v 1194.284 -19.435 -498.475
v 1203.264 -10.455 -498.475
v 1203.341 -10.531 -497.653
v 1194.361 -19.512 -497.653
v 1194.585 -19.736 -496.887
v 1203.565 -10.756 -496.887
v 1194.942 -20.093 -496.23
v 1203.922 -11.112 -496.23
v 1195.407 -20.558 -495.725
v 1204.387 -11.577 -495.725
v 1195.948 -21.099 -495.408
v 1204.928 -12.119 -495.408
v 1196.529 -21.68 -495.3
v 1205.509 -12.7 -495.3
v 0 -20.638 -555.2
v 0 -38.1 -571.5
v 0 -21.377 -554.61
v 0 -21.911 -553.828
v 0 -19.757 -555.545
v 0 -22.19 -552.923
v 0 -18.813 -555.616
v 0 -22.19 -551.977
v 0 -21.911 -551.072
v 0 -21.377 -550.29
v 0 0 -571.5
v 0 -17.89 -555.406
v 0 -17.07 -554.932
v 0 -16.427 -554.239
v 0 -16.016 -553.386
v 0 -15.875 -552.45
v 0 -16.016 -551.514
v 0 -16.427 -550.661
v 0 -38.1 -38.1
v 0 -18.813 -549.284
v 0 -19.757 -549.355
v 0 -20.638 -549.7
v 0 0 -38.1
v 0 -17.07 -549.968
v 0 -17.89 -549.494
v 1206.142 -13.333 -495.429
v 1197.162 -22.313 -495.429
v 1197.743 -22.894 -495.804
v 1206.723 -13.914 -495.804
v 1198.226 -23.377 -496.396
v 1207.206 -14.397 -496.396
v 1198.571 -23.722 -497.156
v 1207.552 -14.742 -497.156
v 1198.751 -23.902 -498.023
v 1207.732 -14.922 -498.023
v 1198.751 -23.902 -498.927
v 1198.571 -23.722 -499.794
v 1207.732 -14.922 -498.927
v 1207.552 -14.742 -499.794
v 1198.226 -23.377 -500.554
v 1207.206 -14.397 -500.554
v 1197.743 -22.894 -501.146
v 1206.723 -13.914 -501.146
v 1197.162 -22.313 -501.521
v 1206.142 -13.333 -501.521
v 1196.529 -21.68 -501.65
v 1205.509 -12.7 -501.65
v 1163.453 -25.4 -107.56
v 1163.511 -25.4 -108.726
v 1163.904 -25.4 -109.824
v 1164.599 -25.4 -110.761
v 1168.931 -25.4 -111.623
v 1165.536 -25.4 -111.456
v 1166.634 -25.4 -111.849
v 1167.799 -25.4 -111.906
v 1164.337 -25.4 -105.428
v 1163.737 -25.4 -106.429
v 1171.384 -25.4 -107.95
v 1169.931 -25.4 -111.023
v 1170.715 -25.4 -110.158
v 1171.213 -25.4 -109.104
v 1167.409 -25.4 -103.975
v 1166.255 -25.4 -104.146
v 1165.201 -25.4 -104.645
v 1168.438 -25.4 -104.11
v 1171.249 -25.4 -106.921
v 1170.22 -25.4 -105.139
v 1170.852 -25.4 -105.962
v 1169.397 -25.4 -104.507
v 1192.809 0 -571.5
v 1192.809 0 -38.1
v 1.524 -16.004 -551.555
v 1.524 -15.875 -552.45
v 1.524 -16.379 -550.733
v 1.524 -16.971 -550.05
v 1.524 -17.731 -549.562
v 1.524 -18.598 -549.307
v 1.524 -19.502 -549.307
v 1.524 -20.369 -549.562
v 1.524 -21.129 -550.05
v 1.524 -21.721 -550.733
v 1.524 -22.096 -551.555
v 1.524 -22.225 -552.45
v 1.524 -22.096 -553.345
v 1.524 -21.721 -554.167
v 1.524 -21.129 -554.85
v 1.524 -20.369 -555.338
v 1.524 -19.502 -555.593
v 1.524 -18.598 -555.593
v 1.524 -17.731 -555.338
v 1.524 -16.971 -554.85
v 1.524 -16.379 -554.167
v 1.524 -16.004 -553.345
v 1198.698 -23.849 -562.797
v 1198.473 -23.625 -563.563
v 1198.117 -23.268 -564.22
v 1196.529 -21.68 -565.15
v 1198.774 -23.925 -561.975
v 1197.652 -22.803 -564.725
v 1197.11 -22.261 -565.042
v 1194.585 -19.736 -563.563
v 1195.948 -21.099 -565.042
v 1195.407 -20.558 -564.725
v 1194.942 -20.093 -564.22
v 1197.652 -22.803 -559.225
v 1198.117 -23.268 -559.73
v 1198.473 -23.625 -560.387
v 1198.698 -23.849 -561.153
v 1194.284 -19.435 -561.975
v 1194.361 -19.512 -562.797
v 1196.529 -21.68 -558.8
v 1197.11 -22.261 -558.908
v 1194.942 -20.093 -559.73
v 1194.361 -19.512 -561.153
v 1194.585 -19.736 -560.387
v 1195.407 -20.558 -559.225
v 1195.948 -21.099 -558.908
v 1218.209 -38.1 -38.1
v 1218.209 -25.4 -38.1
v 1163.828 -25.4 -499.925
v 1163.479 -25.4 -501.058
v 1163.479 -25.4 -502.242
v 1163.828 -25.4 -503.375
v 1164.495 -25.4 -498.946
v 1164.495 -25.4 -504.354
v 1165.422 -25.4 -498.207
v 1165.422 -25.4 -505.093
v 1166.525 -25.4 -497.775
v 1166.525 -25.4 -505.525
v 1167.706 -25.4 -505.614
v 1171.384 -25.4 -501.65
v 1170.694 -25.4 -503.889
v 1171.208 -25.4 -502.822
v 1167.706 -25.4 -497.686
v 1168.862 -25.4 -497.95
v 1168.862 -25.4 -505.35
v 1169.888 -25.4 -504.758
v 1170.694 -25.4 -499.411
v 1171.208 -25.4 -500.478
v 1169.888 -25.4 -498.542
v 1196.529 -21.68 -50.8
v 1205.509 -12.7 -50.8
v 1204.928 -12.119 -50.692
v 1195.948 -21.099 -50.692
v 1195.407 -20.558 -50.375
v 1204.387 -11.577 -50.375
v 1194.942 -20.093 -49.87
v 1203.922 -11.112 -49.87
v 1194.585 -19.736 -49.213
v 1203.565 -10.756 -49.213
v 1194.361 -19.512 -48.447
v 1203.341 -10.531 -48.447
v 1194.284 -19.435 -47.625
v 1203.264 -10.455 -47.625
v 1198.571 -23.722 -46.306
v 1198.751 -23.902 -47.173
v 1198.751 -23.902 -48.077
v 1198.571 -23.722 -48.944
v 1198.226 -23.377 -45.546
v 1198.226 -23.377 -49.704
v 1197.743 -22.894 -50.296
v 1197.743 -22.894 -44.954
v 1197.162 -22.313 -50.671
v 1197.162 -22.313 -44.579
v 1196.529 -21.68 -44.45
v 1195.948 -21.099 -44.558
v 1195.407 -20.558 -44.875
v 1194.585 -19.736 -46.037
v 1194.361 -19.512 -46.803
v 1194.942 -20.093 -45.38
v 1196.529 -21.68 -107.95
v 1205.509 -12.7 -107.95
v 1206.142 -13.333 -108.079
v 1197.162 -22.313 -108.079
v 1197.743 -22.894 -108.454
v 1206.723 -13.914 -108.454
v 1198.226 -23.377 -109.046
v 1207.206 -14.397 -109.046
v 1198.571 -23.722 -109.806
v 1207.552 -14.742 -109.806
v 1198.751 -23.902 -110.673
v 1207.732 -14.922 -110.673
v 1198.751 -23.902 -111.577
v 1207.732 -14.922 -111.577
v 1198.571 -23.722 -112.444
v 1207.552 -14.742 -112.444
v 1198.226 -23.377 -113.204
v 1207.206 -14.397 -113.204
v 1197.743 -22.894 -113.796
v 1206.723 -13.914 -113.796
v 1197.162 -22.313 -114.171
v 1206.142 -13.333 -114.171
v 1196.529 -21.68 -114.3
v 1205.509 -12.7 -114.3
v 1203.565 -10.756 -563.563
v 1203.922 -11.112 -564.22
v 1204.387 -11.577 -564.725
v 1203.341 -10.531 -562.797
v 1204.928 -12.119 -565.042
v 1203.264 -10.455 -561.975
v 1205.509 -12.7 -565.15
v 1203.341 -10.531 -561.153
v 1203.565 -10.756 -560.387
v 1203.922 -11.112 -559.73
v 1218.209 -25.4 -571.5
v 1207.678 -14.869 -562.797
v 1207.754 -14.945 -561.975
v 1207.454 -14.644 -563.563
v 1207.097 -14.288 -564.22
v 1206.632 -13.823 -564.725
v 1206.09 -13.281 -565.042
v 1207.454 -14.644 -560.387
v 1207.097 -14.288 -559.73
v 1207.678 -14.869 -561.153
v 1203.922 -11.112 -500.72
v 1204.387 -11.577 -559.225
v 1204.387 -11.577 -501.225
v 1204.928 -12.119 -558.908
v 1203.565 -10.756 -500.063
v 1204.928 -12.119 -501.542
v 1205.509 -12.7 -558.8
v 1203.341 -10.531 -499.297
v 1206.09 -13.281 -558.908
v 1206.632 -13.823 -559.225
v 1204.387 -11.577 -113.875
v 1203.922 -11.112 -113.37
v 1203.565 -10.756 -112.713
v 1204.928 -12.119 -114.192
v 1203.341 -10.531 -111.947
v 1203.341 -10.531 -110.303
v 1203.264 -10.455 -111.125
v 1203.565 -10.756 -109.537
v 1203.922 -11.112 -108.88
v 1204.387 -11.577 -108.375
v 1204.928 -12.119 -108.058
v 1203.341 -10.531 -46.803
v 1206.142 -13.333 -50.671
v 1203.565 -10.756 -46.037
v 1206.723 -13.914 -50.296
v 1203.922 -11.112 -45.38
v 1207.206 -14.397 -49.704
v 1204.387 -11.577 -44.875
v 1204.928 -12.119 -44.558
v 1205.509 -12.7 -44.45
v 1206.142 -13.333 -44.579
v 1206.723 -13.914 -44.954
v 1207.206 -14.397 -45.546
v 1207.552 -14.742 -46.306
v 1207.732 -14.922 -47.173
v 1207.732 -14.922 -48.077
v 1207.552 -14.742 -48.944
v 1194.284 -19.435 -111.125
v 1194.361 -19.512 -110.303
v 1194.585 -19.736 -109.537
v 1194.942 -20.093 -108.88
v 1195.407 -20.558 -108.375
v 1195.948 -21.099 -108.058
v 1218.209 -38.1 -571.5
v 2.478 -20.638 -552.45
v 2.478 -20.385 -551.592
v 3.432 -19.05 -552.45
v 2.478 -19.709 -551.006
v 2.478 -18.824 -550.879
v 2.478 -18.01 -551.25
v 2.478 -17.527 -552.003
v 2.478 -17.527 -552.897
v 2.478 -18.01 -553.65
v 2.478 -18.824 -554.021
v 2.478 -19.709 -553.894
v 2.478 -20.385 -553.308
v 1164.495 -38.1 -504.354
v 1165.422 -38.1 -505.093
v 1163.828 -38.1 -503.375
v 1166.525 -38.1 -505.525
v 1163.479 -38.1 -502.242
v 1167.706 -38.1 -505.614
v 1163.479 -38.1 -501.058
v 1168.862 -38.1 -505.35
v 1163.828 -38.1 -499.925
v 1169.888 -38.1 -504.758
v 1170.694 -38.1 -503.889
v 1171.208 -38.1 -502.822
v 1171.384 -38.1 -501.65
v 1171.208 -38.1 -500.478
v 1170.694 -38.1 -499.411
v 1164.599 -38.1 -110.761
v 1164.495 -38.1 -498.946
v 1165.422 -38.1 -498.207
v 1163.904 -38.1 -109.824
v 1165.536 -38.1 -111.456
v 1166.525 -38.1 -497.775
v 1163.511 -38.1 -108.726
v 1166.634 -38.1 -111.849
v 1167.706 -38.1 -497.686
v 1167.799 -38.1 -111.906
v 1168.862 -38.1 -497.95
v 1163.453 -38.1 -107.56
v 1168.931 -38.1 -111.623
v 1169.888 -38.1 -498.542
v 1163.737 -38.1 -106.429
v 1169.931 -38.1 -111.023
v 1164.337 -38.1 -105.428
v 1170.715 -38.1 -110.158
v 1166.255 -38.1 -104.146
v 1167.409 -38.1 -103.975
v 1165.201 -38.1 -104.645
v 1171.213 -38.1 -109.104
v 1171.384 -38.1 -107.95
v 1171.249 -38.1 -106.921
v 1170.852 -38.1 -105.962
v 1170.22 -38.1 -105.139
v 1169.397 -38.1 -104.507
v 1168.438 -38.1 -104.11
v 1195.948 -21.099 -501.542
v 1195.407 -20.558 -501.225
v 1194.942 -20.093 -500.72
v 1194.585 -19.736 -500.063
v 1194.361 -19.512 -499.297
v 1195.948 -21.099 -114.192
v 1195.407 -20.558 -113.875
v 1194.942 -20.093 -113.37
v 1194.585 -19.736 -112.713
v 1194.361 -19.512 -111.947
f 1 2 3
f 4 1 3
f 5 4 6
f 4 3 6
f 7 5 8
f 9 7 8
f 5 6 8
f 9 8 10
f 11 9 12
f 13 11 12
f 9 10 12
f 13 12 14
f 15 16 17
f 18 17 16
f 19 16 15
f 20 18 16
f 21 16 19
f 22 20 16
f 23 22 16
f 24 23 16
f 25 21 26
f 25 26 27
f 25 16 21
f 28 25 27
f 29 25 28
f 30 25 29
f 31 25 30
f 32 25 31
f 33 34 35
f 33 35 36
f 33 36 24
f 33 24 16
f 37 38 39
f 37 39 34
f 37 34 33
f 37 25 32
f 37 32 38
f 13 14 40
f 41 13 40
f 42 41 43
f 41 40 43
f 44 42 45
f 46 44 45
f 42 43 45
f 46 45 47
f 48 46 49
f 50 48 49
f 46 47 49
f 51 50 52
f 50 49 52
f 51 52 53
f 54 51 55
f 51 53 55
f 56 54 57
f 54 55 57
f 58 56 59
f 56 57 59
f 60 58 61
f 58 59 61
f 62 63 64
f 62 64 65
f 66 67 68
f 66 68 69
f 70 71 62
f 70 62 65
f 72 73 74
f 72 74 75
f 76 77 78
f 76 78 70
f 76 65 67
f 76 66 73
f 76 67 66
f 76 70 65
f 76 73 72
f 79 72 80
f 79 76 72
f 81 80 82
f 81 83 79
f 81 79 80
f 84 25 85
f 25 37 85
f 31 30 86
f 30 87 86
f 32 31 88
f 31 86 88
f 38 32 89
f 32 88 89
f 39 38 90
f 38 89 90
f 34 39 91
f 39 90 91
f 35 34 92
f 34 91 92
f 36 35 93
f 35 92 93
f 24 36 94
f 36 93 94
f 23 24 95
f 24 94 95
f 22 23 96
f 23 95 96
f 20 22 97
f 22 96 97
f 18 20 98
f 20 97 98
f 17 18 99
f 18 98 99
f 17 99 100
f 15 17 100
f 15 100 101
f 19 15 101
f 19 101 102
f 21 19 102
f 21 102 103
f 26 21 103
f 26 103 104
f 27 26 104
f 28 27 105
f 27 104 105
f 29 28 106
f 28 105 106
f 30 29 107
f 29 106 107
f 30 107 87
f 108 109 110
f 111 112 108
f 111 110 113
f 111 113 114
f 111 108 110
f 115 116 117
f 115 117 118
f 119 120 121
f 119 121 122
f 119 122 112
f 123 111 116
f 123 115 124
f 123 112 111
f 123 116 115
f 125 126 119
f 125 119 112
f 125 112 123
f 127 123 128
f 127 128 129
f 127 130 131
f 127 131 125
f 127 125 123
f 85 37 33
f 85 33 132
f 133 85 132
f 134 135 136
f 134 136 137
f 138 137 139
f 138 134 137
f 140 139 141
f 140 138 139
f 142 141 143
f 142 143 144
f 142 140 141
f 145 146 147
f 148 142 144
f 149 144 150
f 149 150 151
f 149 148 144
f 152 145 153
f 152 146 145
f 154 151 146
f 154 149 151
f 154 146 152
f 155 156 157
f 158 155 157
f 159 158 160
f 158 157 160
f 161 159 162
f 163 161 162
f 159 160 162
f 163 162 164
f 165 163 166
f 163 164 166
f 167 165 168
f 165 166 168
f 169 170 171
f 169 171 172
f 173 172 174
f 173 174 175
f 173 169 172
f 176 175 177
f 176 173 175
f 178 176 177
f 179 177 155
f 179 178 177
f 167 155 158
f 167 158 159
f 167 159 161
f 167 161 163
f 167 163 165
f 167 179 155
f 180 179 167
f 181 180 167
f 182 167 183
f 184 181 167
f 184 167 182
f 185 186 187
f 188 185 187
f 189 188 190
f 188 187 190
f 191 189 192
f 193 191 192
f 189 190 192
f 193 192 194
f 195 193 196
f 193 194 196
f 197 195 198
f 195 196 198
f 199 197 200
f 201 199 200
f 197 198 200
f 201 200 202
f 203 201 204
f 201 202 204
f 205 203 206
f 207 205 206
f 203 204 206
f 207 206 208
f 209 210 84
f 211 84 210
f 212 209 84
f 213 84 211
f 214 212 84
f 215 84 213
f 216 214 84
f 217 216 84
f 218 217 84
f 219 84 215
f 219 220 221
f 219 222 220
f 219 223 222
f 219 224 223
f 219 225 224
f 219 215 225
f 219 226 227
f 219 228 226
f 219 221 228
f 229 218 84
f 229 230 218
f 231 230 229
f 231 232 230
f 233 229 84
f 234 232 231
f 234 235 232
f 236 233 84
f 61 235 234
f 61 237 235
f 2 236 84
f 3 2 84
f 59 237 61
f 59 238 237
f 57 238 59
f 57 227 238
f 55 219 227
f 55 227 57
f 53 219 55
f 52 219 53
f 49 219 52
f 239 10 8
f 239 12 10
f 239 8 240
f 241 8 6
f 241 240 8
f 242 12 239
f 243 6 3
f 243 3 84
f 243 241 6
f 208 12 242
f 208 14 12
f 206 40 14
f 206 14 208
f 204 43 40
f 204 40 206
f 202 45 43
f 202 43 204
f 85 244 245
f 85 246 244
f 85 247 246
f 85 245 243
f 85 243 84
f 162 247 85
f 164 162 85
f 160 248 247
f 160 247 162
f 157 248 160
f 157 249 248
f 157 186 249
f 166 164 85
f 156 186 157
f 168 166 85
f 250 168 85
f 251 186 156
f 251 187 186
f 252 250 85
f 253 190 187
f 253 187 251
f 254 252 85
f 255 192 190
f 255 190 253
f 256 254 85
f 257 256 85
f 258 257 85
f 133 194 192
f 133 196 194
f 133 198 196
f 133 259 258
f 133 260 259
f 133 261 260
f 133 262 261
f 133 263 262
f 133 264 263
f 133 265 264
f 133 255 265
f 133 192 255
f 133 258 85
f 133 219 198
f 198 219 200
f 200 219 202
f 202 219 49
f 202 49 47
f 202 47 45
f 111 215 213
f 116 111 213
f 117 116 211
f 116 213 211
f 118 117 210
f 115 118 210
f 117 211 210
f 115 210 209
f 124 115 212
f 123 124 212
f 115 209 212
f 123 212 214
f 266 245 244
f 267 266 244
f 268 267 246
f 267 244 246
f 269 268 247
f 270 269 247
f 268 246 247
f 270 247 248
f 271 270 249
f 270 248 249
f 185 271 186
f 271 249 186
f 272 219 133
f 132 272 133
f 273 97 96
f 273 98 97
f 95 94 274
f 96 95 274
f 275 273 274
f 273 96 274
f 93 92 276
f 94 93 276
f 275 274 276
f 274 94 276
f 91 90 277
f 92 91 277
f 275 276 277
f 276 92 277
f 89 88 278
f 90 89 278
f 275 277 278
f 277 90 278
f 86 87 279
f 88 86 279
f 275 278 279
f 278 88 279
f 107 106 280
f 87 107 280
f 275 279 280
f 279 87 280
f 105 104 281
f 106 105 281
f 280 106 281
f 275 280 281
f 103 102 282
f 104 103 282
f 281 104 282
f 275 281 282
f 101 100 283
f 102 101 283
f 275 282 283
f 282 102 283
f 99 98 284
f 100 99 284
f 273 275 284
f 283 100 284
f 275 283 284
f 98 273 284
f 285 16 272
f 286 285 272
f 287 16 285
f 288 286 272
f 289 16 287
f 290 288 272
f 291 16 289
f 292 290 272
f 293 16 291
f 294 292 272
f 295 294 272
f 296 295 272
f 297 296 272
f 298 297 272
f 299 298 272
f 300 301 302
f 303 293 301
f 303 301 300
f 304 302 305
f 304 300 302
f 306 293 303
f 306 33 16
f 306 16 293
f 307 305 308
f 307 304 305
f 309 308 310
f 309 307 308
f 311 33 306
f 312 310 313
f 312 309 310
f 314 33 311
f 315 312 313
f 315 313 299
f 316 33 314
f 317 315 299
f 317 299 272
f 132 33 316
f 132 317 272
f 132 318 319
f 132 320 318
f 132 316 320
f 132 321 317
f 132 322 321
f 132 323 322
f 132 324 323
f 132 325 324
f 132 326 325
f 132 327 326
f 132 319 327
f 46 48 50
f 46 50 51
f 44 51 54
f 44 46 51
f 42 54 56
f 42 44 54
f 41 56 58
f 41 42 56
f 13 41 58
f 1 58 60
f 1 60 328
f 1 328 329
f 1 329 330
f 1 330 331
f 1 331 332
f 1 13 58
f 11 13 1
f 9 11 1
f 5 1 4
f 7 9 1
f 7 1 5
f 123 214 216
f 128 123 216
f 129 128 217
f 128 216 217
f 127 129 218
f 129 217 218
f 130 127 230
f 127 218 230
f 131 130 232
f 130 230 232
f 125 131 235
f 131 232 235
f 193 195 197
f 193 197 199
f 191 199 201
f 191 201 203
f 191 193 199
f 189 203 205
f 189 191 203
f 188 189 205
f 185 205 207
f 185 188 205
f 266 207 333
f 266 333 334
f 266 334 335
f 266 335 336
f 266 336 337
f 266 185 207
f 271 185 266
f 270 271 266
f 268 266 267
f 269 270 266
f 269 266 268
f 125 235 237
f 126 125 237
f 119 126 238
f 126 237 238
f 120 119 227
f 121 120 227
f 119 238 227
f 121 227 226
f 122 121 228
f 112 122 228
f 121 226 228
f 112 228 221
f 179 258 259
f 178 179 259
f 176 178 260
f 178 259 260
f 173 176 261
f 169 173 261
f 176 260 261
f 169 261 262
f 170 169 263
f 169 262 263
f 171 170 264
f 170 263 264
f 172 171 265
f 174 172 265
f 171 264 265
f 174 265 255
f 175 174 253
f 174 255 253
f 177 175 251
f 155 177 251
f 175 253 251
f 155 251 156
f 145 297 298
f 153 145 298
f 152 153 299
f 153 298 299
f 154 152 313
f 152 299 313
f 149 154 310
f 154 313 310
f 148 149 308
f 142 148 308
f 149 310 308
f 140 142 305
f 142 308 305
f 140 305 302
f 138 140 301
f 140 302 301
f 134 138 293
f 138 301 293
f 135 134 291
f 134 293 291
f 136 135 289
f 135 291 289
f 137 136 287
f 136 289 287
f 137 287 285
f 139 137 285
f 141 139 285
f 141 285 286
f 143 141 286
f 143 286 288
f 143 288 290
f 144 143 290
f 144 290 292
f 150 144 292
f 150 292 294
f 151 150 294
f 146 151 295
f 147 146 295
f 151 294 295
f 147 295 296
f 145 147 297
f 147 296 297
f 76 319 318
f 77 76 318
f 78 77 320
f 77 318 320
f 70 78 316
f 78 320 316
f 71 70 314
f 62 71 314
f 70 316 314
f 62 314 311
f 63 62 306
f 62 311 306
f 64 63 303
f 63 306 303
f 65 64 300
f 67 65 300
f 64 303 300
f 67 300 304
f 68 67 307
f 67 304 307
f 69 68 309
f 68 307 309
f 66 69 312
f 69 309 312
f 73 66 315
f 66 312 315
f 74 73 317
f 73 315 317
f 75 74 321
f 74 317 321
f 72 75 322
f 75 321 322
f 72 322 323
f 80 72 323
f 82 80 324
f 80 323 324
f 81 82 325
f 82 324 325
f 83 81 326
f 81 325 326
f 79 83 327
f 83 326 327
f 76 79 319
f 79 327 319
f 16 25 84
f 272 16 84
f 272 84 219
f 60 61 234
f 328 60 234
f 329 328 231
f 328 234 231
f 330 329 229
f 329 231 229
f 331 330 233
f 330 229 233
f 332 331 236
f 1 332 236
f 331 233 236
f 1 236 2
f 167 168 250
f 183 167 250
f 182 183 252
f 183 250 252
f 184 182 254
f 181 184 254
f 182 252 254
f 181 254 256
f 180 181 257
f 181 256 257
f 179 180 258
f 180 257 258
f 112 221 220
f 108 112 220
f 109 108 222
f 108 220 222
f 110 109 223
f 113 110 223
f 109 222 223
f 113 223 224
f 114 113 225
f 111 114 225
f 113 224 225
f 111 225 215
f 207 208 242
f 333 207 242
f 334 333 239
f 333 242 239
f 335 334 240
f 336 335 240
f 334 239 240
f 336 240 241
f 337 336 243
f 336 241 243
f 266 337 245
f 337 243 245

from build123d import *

# Parameters (mm, degrees)
F0_W     = 1218.2094
F0_H     = 533.4
F1_DEPTH = 38.1
F3_D     = 6.35
F3_DEPTH = 1.524
F3_TIP   = 1.9077324654
F4_SIZE2 = 25.4
F4_SIZE  = 25.4
F6_DEPTH = 12.7
F7_R     = 3.9751
F8_DEPTH = 12.7


with BuildPart() as f1:
    # F0 (on Front) → F1 (new body)
    with BuildSketch(Plane.XZ):
        with Locations((609.1047, -304.8)):
            Rectangle(F0_W, F0_H)
    extrude(amount=F1_DEPTH)

    # F3
    with Locations(Plane(origin=(0, 0, 0), x_dir=(0, -1, 0), z_dir=(-1, 0, 0))):
        with Locations((19.05, -552.45), (19.05, -590.55)):
            Hole(F3_D / 2, depth=F3_DEPTH)
            with Locations((0, 0, -(F3_DEPTH + F3_TIP / 2))):  # 118° drill point
                Cone(0, F3_D / 2, F3_TIP, mode=Mode.SUBTRACT)

    # F4
    f4_edges = [f1.edges().sort_by_distance(p)[0] for p in [
        (1218.2094, 0, -304.8),
    ]]
    chamfer(f4_edges, length=F4_SIZE, length2=F4_SIZE2)

    # F5 (on face) → F6 (cut)
    with BuildSketch(Plane(origin=(596.4047, 596.4047, 0), x_dir=(-0.7071067812, 0.7071067812, 0), z_dir=(0.7071067812, 0.7071067812, 0))):
        with BuildLine():
            ThreePointArc((-864.5791276452, -561.975), (-863.6491916755, -564.2200640303), (-861.4041276452, -565.15))
            Line((-861.4041276452, -565.15), (-861.4041276452, -561.975))
            Line((-861.4041276452, -561.975), (-864.5791276452, -561.975))
        make_face()
        with BuildLine():
            ThreePointArc((-861.4041276452, -44.45), (-864.5791276452, -47.625), (-861.4041276452, -50.8))
            Line((-861.4041276452, -50.8), (-861.4041276452, -44.45))
        make_face()
        with BuildLine():
            Line((-861.4041276452, -44.45), (-861.4041276452, -50.8))
            ThreePointArc((-861.4041276452, -50.8), (-859.1590636149, -49.8700640303), (-858.2291276452, -47.625))
            ThreePointArc((-858.2291276452, -47.625), (-859.1590636149, -45.3799359697), (-861.4041276452, -44.45))
        make_face()
        with BuildLine():
            ThreePointArc((-861.4041276452, -107.95), (-864.5791276452, -111.125), (-861.4041276452, -114.3))
            Line((-861.4041276452, -114.3), (-861.4041276452, -107.95))
        make_face()
        with BuildLine():
            Line((-861.4041276452, -107.95), (-861.4041276452, -114.3))
            ThreePointArc((-861.4041276452, -114.3), (-859.1590636149, -113.3700640303), (-858.2291276452, -111.125))
            ThreePointArc((-858.2291276452, -111.125), (-859.1590636149, -108.8799359697), (-861.4041276452, -107.95))
        make_face()
        with BuildLine():
            ThreePointArc((-861.4041276452, -495.3), (-864.5791276452, -498.475), (-861.4041276452, -501.65))
            Line((-861.4041276452, -501.65), (-861.4041276452, -498.475))
            Line((-861.4041276452, -498.475), (-861.4041276452, -495.3))
        make_face()
        with BuildLine():
            Line((-861.4041276452, -498.475), (-861.4041276452, -501.65))
            ThreePointArc((-861.4041276452, -501.65), (-859.1590636149, -500.7200640303), (-858.2291276452, -498.475))
            ThreePointArc((-858.2291276452, -498.475), (-859.1590636149, -496.2299359697), (-861.4041276452, -495.3))
            Line((-861.4041276452, -495.3), (-861.4041276452, -498.475))
        make_face()
        with BuildLine():
            Line((-861.4041276452, -561.975), (-861.4041276452, -565.15))
            ThreePointArc((-861.4041276452, -565.15), (-859.1590636149, -564.2200640303), (-858.2291276452, -561.975))
            ThreePointArc((-858.2291276452, -561.975), (-859.1590636149, -559.7299359697), (-861.4041276452, -558.8))
            Line((-861.4041276452, -558.8), (-861.4041276452, -561.975))
        make_face()
        with BuildLine():
            Line((-864.5791276452, -561.975), (-861.4041276452, -561.975))
            Line((-861.4041276452, -561.975), (-861.4041276452, -558.8))
            ThreePointArc((-861.4041276452, -558.8), (-863.6491916755, -559.7299359697), (-864.5791276452, -561.975))
        make_face()
    extrude(amount=-F6_DEPTH, mode=Mode.SUBTRACT)

    # F7 (on face) → F8 (cut)
    with BuildSketch(Plane.XZ.offset(38.1)):
        with BuildLine():
            ThreePointArc((1167.4094, -103.9749), (1164.5985798341, -110.7608201659), (1171.3845, -107.95))
            ThreePointArc((1171.3845, -107.95), (1170.2202201659, -105.1391798341), (1167.4094, -103.9749))
        make_face()
        with Locations((1167.4094, -501.65)):
            Circle(F7_R)
    extrude(amount=-F8_DEPTH, mode=Mode.SUBTRACT)


solid = f1.part
